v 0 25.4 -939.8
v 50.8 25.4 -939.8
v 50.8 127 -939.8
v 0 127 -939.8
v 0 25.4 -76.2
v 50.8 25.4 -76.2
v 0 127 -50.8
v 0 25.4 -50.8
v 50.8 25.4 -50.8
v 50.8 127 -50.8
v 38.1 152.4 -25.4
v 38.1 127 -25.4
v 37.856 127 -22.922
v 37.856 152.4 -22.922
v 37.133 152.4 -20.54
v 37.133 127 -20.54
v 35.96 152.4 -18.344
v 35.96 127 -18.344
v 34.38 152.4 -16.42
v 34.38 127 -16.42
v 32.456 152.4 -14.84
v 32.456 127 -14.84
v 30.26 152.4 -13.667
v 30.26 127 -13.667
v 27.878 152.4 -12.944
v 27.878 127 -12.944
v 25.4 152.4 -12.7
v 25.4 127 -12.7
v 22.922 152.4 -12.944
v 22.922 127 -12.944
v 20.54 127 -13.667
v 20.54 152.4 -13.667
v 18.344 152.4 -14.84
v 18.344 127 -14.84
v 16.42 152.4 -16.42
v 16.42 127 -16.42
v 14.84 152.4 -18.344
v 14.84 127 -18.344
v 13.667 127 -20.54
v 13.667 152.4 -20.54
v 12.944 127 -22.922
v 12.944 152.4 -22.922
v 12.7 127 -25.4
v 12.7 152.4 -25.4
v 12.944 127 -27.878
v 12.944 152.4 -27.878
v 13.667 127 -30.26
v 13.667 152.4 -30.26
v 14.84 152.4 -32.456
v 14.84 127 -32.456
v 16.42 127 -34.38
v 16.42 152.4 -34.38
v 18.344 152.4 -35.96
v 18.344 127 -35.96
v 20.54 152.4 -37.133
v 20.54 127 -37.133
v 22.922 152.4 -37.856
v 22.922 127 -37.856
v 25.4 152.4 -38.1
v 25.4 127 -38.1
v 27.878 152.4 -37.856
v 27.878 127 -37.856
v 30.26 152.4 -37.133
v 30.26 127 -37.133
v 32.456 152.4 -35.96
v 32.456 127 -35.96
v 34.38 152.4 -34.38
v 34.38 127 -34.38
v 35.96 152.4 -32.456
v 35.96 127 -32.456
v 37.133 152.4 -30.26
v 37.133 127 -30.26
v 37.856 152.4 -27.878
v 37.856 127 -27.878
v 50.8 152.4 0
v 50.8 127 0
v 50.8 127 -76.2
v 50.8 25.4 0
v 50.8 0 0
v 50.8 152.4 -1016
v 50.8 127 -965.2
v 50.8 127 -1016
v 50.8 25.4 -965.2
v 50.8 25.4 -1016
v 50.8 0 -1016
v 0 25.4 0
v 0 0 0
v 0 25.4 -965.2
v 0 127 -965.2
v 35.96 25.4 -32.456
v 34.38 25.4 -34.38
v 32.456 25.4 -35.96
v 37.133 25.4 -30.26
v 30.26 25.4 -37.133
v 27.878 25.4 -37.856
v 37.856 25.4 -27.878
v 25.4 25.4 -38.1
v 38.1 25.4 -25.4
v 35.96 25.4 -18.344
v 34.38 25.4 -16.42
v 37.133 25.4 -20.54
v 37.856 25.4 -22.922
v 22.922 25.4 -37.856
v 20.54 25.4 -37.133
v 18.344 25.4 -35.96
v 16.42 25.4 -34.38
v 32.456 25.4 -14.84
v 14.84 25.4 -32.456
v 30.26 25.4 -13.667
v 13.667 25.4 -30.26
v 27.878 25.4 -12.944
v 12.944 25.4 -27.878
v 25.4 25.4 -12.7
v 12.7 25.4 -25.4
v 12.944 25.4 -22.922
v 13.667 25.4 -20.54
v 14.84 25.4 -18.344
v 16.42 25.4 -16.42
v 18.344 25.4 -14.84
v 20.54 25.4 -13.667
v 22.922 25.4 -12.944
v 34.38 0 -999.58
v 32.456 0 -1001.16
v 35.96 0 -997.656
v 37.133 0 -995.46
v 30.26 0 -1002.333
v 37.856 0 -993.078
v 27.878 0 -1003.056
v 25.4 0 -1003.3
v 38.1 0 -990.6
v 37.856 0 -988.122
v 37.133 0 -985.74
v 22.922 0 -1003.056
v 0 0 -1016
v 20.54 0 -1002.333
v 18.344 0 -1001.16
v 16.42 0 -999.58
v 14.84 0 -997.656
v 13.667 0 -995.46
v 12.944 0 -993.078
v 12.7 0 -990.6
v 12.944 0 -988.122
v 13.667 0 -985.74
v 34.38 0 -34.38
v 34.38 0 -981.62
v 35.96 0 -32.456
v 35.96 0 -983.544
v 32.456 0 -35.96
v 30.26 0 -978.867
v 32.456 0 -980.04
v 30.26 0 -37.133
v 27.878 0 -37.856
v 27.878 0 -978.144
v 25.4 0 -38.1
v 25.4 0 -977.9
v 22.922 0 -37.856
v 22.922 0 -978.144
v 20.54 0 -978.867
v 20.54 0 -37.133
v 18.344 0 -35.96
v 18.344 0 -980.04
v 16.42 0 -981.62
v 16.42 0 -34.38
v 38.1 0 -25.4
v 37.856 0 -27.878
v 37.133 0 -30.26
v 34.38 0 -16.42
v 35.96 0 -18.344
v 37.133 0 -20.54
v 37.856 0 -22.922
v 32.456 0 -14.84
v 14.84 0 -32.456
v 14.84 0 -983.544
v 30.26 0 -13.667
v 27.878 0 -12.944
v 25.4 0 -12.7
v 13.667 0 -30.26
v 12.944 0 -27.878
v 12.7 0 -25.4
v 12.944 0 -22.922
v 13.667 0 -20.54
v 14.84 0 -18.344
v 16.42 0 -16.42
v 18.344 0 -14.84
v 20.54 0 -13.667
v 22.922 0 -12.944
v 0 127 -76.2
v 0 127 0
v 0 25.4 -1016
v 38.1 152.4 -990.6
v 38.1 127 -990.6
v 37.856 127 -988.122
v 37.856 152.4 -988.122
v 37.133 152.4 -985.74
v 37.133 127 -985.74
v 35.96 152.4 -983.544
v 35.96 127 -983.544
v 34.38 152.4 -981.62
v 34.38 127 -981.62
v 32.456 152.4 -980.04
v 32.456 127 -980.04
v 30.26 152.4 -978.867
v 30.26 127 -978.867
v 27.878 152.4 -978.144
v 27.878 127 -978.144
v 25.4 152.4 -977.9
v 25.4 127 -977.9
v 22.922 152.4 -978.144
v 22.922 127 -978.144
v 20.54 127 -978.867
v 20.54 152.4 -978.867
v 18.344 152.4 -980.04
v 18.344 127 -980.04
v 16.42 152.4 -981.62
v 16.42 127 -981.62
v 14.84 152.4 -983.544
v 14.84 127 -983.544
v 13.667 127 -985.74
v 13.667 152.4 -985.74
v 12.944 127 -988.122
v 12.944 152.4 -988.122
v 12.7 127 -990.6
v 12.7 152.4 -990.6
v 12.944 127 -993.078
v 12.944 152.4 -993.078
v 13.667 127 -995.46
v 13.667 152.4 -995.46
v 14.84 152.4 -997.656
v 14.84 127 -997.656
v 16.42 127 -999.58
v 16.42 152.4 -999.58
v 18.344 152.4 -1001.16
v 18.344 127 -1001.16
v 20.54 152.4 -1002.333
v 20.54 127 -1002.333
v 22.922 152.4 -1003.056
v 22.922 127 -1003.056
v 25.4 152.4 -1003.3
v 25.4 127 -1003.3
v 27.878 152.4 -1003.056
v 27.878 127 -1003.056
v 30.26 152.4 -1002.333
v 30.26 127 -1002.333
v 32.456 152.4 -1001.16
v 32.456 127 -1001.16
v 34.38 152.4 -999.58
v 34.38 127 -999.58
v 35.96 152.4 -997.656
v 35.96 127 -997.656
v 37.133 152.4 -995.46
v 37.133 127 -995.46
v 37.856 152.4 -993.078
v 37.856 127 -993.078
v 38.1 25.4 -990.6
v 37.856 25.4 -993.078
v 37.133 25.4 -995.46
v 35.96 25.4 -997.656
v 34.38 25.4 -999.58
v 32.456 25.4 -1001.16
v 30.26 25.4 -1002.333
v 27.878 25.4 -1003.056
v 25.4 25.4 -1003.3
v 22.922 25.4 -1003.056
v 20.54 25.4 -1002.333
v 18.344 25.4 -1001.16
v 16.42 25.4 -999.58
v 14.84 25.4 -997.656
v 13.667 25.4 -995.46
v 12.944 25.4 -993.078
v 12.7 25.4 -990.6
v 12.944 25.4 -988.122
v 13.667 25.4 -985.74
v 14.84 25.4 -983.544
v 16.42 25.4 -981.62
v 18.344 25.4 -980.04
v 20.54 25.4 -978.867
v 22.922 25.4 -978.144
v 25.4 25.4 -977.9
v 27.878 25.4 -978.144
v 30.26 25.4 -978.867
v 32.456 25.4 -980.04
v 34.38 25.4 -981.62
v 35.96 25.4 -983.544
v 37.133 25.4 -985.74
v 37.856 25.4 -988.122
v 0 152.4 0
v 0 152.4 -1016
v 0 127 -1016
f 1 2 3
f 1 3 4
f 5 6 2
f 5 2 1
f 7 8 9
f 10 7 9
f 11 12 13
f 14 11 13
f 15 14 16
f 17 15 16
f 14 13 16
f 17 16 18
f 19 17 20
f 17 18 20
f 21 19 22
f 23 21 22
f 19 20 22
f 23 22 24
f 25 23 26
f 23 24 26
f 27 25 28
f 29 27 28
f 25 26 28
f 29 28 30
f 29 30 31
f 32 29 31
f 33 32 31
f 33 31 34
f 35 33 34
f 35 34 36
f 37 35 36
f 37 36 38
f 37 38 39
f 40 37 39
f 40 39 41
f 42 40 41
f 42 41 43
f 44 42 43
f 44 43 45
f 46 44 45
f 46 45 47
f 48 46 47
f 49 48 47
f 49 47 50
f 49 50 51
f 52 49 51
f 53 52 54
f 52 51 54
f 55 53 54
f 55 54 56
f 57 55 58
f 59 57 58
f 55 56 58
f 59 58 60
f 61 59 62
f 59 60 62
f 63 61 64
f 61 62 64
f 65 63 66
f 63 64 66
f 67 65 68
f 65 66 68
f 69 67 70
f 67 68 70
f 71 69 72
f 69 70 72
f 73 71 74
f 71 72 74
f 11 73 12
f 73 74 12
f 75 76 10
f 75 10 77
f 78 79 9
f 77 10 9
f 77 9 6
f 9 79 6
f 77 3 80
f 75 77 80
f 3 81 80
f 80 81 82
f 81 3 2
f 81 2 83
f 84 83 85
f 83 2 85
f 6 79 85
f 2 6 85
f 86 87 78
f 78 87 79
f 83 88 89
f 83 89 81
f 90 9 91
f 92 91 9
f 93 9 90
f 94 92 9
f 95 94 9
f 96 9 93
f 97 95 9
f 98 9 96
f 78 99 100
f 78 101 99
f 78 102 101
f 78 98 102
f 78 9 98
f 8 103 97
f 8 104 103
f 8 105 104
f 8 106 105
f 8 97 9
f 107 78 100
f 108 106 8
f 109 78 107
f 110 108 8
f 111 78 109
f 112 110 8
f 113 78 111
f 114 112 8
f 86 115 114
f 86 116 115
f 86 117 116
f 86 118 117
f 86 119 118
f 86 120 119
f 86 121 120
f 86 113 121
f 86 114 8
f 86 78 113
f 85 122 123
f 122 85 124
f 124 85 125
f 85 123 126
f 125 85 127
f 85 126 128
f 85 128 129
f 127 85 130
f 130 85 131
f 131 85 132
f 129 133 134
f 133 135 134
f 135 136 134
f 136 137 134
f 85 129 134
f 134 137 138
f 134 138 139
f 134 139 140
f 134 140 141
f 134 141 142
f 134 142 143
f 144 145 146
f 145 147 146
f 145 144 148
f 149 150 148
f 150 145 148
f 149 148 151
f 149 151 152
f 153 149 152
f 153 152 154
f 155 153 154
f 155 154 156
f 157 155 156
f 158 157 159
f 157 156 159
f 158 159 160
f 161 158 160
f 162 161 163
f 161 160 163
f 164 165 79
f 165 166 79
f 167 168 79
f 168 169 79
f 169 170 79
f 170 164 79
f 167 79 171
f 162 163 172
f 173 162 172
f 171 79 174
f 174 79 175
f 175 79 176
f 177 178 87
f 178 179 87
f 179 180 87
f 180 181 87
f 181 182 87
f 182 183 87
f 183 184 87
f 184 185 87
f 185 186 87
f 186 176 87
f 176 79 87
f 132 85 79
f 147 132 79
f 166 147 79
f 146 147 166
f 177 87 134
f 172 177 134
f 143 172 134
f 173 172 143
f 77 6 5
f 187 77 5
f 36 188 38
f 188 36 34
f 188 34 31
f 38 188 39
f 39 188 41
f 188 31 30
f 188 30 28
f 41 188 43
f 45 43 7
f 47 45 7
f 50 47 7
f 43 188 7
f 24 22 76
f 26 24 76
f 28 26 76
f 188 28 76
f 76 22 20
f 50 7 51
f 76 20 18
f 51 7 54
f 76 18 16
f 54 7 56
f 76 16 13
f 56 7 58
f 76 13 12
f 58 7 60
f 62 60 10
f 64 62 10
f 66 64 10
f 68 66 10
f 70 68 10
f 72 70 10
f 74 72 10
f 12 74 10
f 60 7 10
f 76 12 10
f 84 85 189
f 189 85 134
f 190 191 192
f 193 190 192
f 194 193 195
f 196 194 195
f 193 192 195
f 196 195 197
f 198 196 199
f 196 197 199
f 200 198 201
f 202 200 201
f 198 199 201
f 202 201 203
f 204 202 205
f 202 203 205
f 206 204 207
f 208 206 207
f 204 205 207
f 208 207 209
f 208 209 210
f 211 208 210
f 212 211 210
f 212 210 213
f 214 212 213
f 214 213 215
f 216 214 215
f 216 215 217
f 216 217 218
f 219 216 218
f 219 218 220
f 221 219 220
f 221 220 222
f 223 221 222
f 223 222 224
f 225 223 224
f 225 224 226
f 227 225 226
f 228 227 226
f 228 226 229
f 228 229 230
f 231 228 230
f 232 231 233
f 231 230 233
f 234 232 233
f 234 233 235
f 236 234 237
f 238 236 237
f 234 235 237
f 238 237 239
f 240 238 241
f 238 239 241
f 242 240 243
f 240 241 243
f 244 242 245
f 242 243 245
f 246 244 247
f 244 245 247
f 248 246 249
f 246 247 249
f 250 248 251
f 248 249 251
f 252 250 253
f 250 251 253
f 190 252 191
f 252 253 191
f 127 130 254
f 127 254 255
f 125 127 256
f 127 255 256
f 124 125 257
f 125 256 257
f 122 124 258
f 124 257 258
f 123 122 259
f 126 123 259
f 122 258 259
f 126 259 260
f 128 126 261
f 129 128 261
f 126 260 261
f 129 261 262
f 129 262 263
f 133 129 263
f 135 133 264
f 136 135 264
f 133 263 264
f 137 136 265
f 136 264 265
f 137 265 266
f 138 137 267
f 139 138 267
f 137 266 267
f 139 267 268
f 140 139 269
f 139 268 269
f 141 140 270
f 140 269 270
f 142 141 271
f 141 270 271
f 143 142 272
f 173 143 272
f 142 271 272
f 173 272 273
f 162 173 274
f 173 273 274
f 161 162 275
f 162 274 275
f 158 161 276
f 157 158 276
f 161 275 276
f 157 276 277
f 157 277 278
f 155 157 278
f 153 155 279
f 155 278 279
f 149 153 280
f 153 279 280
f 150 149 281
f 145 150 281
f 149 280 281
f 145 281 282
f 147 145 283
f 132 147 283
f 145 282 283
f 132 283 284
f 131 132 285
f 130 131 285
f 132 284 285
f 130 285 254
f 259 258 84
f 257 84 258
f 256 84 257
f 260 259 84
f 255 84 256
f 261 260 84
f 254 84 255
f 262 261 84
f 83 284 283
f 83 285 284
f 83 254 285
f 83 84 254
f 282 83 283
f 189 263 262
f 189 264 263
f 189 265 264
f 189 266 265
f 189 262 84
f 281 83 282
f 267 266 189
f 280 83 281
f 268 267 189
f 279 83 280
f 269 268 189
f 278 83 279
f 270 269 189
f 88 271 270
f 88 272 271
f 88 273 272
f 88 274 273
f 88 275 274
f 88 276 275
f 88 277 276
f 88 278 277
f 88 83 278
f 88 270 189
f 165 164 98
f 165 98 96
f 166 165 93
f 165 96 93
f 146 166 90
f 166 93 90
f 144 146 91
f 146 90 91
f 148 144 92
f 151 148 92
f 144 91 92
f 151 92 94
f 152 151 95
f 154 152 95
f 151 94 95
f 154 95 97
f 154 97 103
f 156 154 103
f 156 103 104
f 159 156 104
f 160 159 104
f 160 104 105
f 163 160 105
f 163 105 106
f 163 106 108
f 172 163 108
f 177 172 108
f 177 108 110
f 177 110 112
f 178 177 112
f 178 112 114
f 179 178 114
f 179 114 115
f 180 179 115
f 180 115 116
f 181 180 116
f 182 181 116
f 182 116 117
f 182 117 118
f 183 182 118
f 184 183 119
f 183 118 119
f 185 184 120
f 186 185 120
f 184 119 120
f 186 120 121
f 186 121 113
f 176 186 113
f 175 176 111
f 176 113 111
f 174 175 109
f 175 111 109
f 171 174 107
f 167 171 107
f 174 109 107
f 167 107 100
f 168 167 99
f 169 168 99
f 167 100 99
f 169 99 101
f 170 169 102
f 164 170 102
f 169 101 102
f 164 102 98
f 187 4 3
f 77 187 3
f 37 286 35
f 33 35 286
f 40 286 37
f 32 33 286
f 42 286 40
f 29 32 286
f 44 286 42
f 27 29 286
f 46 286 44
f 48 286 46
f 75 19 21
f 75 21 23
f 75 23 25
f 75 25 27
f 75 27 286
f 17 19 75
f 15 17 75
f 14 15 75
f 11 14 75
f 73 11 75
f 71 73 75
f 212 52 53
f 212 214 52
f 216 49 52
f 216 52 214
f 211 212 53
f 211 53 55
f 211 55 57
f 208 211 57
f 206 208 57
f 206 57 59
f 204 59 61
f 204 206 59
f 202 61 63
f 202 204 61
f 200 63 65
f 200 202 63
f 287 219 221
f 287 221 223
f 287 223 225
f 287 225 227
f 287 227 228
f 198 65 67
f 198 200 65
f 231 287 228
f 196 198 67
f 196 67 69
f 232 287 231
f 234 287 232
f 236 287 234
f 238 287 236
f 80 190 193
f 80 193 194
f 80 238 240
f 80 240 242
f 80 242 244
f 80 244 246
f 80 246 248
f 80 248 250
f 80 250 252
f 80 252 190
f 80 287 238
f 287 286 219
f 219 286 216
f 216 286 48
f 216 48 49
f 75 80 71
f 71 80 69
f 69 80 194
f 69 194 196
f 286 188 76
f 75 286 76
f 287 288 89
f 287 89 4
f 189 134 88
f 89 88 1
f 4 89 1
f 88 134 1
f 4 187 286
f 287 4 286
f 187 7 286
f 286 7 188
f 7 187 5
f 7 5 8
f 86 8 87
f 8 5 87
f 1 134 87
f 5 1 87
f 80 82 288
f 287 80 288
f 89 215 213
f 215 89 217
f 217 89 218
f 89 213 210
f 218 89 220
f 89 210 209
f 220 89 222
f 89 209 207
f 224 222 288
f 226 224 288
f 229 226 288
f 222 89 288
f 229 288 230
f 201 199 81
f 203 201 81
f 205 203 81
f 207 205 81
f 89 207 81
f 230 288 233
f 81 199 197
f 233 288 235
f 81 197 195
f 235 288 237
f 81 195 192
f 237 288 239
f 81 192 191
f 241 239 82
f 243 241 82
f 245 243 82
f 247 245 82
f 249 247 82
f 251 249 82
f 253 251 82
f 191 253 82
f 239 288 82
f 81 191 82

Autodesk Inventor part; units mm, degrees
ref_plane "YZ Plane" through (0, 0, 0) normal (1, 0, 0) x (0, 1, 0)
ref_plane "XZ Plane" through (0, 0, 0) normal (0, 1, 0) x (-1, 0, 0)
ref_plane "XY Plane" through (0, 0, 0) normal (0, 0, 1) x (1, 0, 0)
sketch "Sketch1" plane through (0, 0, 0) normal (0, 1, 0) x (-1, 0, 0)
  line L0 (0, 0) -> (-50.8, 0)
  line L1 (-50.8, 0) -> (-50.8, -1016)
  line L2 (-50.8, -1016) -> (0, -1016)
  line L3 (0, -1016) -> (0, 0)
  dimension "d0" = 1016
  dimension "d1" = 50.8
extrude "Extrusion1" add sketch "Sketch1" along normal blind 25.4
sketch "Sketch2" plane through (0, 25.4, 0) normal (0, 1, 0) x (1, 0, 0)
  line L0 (0, 50.8) -> (50.8, 50.8)
  line L1 (50.8, 50.8) -> (50.8, 76.2)
  line L2 (50.8, 76.2) -> (0, 76.2)
  line L3 (0, 76.2) -> (0, 50.8)
  line L4 (0, 965.2) -> (50.8, 965.2)
  line L5 (50.8, 965.2) -> (50.8, 939.8)
  line L6 (50.8, 939.8) -> (0, 939.8)
  line L7 (0, 939.8) -> (0, 965.2)
  line L8 (50.8, 1016) -> (0, 1016) projected
  line L9 (0, 0) -> (50.8, 0) projected
  dimension "d5" = 25.4
  dimension "d12" = 25.4
  dimension "d16" = 50.8
  dimension "d17" = 50.8
extrude "Extrusion2" add sketch "Sketch2" along normal blind 101.6
sketch "Sketch3" plane through (0, 25.4, 0) normal (0, 1, 0) x (1, 0, 0)
  circle A0 centre (25.4, 25.4) radius 12.7
  line L0 (0, 50.8) -> (0, 0) projected
  line L1 (0, 0) -> (50.8, 0) projected
  circle A1 centre (25.4, 990.6) radius 12.7
  line L2 (50.8, 1016) -> (0, 1016) projected
  line L3 (50.8, 965.2) -> (50.8, 1016) projected
  dimension "d18" = 25.4
  dimension "d19" = 25.4
  dimension "d20" = 25.4
  dimension "d21" = 25.4
  dimension "d22" = 25.4
  dimension "d23" = 25.4
sketch "Sketch4" plane through (0, 127, 0) normal (0, 1, 0) x (1, 0, 0)
  line L0 (0, 0) -> (50.8, 0)
  line L1 (50.8, 0) -> (50.8, 1016)
  line L2 (50.8, 1016) -> (0, 1016)
  line L3 (0, 1016) -> (0, 0)
extrude "Extrusion3" add sketch "Sketch4" along normal blind 25.4
extrude "Extrusion4" cut sketch "Sketch3" along normal blind 174.625 and the other way blind 63.5
properties part number "arm"
